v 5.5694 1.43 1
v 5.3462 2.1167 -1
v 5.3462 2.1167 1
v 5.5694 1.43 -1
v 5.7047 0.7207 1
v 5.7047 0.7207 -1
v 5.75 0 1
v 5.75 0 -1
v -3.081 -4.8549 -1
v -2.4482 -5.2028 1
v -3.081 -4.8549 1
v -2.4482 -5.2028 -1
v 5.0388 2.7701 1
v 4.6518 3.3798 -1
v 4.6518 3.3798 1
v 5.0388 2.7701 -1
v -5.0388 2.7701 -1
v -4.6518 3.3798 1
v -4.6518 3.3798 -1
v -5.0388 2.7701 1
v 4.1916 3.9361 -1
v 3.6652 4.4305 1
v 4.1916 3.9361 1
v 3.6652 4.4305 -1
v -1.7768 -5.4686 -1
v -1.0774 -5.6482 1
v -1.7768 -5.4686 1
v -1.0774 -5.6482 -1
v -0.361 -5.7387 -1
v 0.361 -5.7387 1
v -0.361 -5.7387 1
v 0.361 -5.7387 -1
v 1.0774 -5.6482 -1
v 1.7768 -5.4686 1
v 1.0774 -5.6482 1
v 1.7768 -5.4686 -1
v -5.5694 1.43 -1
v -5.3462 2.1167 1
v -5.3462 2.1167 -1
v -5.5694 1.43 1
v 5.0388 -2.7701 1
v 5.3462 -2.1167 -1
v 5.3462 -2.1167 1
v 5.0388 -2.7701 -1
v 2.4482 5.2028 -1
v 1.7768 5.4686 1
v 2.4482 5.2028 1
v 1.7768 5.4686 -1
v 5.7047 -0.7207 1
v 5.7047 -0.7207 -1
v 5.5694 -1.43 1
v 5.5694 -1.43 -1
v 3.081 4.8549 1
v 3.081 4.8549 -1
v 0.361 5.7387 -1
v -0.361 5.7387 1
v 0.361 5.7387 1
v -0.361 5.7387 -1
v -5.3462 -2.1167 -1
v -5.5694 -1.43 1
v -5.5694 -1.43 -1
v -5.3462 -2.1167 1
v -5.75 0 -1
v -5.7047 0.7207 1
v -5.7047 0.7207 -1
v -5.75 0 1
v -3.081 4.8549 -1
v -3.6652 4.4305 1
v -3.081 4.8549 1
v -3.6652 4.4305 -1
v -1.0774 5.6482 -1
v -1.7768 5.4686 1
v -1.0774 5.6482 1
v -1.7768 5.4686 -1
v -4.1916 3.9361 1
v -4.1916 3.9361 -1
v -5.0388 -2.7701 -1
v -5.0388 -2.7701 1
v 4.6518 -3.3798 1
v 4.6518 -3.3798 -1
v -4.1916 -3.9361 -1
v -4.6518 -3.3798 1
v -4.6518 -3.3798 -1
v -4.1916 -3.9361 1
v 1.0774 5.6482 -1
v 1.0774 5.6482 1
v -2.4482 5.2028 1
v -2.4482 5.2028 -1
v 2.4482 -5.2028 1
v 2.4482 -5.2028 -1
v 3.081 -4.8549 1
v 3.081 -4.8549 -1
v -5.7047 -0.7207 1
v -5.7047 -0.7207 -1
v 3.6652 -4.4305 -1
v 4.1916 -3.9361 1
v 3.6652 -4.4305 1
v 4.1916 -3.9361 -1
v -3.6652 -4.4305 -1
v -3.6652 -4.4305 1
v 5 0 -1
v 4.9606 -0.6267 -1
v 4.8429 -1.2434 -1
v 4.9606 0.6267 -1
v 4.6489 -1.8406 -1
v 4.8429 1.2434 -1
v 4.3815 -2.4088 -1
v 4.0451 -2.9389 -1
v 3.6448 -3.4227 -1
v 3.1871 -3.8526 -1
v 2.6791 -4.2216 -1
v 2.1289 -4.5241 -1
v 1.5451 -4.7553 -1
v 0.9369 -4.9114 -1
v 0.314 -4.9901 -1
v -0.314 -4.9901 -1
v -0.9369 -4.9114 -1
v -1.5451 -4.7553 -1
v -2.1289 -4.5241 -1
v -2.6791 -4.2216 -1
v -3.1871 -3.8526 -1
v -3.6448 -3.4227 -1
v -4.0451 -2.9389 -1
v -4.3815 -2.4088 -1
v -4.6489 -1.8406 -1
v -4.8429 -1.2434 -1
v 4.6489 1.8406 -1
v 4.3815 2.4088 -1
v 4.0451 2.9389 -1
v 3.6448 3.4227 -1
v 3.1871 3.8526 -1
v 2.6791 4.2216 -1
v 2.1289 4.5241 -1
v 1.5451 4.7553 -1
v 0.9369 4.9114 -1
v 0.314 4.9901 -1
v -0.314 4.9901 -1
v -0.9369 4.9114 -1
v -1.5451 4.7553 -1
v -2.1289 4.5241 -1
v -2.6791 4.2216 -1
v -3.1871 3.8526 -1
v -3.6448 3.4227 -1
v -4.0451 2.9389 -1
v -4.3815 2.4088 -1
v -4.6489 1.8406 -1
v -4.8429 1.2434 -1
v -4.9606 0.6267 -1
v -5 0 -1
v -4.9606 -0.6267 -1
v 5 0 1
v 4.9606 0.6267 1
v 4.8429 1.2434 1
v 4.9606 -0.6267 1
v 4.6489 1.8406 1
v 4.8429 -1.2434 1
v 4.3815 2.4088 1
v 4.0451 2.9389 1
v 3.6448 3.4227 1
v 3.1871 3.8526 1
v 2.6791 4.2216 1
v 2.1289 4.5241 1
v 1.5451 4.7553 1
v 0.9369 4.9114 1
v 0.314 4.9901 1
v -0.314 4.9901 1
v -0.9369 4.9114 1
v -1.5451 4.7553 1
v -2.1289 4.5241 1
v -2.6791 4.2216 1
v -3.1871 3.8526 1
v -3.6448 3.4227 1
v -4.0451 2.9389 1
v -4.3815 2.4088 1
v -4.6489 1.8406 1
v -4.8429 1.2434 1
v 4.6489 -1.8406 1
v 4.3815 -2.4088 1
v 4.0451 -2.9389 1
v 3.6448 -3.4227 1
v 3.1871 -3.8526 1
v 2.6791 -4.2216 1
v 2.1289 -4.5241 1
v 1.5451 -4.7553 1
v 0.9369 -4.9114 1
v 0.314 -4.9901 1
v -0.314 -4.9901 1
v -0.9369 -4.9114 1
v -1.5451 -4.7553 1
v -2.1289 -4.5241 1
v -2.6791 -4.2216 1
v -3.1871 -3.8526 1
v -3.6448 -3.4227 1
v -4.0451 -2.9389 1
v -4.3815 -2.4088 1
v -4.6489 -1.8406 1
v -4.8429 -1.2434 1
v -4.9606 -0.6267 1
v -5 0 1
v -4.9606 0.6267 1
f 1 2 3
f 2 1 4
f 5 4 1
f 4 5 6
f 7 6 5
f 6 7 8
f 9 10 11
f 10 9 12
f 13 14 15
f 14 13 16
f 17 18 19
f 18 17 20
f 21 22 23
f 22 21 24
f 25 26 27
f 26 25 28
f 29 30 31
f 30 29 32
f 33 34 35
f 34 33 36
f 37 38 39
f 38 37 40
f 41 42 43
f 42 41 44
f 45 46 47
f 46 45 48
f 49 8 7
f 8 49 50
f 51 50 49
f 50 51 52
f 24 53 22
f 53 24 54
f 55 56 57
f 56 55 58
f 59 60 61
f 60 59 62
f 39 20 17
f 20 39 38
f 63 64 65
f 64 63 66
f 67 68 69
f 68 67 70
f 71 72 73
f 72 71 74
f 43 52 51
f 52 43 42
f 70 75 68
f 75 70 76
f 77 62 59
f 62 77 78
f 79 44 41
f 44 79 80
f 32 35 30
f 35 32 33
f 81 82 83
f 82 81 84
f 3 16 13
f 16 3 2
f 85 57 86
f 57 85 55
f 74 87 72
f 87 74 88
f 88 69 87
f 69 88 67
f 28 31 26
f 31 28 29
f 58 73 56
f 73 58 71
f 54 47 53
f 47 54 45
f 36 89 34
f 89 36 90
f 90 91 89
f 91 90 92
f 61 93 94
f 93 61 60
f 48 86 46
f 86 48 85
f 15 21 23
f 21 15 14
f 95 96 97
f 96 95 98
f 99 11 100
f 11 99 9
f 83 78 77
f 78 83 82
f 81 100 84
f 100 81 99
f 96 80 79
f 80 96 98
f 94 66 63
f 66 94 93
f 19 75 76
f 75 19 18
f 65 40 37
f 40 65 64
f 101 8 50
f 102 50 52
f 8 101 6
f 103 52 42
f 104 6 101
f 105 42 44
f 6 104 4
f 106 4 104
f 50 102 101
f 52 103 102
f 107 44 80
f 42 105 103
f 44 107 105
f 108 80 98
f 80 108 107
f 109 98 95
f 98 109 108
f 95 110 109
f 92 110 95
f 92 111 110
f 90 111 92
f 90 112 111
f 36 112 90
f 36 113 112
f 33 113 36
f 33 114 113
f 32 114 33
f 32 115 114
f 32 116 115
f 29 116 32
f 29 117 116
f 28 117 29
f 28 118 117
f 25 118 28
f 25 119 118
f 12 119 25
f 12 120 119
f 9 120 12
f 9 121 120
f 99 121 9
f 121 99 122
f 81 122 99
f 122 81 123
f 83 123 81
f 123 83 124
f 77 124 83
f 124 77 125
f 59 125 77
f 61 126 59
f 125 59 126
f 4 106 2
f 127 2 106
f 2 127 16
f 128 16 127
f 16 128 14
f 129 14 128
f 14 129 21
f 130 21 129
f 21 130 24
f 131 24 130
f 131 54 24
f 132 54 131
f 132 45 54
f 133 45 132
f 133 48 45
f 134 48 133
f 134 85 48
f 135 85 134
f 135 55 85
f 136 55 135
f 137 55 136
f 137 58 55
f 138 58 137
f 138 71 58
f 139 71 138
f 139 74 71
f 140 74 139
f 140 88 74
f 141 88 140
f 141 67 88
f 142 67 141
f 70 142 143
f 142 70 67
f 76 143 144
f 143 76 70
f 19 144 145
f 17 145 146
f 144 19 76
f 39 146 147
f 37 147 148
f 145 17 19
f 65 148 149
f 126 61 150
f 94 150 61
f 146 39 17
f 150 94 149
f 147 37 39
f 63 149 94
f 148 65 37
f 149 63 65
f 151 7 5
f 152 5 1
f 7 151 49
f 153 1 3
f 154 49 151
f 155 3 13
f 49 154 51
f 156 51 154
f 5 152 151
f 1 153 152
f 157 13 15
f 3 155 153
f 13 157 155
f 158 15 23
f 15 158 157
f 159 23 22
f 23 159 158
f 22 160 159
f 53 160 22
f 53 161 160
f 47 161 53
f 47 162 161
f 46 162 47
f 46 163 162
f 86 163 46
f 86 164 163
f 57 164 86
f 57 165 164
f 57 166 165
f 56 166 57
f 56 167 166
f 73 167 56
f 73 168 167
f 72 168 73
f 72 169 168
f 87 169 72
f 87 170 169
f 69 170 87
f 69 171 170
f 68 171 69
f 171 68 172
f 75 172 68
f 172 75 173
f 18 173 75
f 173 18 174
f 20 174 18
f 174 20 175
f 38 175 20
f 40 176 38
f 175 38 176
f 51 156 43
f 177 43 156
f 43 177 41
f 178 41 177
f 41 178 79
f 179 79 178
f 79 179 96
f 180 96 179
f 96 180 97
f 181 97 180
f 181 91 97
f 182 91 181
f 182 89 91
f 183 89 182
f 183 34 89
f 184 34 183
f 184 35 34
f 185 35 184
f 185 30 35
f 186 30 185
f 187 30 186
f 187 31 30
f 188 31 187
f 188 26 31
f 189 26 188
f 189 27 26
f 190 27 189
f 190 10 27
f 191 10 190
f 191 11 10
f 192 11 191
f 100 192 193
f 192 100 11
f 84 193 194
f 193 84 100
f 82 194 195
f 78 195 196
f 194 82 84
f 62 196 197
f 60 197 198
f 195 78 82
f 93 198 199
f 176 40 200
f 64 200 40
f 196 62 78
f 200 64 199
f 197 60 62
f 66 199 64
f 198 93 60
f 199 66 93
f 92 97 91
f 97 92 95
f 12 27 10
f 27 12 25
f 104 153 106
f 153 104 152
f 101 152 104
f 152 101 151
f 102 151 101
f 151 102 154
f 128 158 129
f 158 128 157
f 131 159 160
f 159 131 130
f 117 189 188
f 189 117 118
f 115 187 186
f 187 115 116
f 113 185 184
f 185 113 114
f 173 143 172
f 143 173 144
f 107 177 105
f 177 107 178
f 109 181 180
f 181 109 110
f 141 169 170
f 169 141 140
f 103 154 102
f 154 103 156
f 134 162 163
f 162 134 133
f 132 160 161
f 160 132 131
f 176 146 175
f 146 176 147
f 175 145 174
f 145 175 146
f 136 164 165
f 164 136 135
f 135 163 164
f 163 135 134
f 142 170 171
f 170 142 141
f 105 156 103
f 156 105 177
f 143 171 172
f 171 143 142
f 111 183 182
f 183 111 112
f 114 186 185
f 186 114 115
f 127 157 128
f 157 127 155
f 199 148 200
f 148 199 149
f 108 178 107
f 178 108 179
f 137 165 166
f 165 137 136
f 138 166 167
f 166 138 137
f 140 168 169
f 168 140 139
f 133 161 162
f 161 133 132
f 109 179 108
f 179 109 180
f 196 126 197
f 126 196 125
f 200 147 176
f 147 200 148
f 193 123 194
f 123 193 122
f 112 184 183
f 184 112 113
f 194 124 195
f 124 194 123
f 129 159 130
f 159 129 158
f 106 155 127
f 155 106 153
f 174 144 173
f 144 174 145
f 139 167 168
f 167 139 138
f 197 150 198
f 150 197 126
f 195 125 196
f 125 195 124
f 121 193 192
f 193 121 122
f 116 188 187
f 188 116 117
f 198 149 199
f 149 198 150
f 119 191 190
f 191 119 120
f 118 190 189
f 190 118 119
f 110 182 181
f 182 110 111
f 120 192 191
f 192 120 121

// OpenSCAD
$fn = 50;


difference() {
	union() {
		translate(v = [0, 0, -1.0000000000]) {
			cylinder(h = 2, r = 5.7500000000);
		}
	}
	union() {
		translate(v = [0, 0, -100.0000000000]) {
			cylinder(h = 200, r = 5.0000000000);
		}
	}
}
